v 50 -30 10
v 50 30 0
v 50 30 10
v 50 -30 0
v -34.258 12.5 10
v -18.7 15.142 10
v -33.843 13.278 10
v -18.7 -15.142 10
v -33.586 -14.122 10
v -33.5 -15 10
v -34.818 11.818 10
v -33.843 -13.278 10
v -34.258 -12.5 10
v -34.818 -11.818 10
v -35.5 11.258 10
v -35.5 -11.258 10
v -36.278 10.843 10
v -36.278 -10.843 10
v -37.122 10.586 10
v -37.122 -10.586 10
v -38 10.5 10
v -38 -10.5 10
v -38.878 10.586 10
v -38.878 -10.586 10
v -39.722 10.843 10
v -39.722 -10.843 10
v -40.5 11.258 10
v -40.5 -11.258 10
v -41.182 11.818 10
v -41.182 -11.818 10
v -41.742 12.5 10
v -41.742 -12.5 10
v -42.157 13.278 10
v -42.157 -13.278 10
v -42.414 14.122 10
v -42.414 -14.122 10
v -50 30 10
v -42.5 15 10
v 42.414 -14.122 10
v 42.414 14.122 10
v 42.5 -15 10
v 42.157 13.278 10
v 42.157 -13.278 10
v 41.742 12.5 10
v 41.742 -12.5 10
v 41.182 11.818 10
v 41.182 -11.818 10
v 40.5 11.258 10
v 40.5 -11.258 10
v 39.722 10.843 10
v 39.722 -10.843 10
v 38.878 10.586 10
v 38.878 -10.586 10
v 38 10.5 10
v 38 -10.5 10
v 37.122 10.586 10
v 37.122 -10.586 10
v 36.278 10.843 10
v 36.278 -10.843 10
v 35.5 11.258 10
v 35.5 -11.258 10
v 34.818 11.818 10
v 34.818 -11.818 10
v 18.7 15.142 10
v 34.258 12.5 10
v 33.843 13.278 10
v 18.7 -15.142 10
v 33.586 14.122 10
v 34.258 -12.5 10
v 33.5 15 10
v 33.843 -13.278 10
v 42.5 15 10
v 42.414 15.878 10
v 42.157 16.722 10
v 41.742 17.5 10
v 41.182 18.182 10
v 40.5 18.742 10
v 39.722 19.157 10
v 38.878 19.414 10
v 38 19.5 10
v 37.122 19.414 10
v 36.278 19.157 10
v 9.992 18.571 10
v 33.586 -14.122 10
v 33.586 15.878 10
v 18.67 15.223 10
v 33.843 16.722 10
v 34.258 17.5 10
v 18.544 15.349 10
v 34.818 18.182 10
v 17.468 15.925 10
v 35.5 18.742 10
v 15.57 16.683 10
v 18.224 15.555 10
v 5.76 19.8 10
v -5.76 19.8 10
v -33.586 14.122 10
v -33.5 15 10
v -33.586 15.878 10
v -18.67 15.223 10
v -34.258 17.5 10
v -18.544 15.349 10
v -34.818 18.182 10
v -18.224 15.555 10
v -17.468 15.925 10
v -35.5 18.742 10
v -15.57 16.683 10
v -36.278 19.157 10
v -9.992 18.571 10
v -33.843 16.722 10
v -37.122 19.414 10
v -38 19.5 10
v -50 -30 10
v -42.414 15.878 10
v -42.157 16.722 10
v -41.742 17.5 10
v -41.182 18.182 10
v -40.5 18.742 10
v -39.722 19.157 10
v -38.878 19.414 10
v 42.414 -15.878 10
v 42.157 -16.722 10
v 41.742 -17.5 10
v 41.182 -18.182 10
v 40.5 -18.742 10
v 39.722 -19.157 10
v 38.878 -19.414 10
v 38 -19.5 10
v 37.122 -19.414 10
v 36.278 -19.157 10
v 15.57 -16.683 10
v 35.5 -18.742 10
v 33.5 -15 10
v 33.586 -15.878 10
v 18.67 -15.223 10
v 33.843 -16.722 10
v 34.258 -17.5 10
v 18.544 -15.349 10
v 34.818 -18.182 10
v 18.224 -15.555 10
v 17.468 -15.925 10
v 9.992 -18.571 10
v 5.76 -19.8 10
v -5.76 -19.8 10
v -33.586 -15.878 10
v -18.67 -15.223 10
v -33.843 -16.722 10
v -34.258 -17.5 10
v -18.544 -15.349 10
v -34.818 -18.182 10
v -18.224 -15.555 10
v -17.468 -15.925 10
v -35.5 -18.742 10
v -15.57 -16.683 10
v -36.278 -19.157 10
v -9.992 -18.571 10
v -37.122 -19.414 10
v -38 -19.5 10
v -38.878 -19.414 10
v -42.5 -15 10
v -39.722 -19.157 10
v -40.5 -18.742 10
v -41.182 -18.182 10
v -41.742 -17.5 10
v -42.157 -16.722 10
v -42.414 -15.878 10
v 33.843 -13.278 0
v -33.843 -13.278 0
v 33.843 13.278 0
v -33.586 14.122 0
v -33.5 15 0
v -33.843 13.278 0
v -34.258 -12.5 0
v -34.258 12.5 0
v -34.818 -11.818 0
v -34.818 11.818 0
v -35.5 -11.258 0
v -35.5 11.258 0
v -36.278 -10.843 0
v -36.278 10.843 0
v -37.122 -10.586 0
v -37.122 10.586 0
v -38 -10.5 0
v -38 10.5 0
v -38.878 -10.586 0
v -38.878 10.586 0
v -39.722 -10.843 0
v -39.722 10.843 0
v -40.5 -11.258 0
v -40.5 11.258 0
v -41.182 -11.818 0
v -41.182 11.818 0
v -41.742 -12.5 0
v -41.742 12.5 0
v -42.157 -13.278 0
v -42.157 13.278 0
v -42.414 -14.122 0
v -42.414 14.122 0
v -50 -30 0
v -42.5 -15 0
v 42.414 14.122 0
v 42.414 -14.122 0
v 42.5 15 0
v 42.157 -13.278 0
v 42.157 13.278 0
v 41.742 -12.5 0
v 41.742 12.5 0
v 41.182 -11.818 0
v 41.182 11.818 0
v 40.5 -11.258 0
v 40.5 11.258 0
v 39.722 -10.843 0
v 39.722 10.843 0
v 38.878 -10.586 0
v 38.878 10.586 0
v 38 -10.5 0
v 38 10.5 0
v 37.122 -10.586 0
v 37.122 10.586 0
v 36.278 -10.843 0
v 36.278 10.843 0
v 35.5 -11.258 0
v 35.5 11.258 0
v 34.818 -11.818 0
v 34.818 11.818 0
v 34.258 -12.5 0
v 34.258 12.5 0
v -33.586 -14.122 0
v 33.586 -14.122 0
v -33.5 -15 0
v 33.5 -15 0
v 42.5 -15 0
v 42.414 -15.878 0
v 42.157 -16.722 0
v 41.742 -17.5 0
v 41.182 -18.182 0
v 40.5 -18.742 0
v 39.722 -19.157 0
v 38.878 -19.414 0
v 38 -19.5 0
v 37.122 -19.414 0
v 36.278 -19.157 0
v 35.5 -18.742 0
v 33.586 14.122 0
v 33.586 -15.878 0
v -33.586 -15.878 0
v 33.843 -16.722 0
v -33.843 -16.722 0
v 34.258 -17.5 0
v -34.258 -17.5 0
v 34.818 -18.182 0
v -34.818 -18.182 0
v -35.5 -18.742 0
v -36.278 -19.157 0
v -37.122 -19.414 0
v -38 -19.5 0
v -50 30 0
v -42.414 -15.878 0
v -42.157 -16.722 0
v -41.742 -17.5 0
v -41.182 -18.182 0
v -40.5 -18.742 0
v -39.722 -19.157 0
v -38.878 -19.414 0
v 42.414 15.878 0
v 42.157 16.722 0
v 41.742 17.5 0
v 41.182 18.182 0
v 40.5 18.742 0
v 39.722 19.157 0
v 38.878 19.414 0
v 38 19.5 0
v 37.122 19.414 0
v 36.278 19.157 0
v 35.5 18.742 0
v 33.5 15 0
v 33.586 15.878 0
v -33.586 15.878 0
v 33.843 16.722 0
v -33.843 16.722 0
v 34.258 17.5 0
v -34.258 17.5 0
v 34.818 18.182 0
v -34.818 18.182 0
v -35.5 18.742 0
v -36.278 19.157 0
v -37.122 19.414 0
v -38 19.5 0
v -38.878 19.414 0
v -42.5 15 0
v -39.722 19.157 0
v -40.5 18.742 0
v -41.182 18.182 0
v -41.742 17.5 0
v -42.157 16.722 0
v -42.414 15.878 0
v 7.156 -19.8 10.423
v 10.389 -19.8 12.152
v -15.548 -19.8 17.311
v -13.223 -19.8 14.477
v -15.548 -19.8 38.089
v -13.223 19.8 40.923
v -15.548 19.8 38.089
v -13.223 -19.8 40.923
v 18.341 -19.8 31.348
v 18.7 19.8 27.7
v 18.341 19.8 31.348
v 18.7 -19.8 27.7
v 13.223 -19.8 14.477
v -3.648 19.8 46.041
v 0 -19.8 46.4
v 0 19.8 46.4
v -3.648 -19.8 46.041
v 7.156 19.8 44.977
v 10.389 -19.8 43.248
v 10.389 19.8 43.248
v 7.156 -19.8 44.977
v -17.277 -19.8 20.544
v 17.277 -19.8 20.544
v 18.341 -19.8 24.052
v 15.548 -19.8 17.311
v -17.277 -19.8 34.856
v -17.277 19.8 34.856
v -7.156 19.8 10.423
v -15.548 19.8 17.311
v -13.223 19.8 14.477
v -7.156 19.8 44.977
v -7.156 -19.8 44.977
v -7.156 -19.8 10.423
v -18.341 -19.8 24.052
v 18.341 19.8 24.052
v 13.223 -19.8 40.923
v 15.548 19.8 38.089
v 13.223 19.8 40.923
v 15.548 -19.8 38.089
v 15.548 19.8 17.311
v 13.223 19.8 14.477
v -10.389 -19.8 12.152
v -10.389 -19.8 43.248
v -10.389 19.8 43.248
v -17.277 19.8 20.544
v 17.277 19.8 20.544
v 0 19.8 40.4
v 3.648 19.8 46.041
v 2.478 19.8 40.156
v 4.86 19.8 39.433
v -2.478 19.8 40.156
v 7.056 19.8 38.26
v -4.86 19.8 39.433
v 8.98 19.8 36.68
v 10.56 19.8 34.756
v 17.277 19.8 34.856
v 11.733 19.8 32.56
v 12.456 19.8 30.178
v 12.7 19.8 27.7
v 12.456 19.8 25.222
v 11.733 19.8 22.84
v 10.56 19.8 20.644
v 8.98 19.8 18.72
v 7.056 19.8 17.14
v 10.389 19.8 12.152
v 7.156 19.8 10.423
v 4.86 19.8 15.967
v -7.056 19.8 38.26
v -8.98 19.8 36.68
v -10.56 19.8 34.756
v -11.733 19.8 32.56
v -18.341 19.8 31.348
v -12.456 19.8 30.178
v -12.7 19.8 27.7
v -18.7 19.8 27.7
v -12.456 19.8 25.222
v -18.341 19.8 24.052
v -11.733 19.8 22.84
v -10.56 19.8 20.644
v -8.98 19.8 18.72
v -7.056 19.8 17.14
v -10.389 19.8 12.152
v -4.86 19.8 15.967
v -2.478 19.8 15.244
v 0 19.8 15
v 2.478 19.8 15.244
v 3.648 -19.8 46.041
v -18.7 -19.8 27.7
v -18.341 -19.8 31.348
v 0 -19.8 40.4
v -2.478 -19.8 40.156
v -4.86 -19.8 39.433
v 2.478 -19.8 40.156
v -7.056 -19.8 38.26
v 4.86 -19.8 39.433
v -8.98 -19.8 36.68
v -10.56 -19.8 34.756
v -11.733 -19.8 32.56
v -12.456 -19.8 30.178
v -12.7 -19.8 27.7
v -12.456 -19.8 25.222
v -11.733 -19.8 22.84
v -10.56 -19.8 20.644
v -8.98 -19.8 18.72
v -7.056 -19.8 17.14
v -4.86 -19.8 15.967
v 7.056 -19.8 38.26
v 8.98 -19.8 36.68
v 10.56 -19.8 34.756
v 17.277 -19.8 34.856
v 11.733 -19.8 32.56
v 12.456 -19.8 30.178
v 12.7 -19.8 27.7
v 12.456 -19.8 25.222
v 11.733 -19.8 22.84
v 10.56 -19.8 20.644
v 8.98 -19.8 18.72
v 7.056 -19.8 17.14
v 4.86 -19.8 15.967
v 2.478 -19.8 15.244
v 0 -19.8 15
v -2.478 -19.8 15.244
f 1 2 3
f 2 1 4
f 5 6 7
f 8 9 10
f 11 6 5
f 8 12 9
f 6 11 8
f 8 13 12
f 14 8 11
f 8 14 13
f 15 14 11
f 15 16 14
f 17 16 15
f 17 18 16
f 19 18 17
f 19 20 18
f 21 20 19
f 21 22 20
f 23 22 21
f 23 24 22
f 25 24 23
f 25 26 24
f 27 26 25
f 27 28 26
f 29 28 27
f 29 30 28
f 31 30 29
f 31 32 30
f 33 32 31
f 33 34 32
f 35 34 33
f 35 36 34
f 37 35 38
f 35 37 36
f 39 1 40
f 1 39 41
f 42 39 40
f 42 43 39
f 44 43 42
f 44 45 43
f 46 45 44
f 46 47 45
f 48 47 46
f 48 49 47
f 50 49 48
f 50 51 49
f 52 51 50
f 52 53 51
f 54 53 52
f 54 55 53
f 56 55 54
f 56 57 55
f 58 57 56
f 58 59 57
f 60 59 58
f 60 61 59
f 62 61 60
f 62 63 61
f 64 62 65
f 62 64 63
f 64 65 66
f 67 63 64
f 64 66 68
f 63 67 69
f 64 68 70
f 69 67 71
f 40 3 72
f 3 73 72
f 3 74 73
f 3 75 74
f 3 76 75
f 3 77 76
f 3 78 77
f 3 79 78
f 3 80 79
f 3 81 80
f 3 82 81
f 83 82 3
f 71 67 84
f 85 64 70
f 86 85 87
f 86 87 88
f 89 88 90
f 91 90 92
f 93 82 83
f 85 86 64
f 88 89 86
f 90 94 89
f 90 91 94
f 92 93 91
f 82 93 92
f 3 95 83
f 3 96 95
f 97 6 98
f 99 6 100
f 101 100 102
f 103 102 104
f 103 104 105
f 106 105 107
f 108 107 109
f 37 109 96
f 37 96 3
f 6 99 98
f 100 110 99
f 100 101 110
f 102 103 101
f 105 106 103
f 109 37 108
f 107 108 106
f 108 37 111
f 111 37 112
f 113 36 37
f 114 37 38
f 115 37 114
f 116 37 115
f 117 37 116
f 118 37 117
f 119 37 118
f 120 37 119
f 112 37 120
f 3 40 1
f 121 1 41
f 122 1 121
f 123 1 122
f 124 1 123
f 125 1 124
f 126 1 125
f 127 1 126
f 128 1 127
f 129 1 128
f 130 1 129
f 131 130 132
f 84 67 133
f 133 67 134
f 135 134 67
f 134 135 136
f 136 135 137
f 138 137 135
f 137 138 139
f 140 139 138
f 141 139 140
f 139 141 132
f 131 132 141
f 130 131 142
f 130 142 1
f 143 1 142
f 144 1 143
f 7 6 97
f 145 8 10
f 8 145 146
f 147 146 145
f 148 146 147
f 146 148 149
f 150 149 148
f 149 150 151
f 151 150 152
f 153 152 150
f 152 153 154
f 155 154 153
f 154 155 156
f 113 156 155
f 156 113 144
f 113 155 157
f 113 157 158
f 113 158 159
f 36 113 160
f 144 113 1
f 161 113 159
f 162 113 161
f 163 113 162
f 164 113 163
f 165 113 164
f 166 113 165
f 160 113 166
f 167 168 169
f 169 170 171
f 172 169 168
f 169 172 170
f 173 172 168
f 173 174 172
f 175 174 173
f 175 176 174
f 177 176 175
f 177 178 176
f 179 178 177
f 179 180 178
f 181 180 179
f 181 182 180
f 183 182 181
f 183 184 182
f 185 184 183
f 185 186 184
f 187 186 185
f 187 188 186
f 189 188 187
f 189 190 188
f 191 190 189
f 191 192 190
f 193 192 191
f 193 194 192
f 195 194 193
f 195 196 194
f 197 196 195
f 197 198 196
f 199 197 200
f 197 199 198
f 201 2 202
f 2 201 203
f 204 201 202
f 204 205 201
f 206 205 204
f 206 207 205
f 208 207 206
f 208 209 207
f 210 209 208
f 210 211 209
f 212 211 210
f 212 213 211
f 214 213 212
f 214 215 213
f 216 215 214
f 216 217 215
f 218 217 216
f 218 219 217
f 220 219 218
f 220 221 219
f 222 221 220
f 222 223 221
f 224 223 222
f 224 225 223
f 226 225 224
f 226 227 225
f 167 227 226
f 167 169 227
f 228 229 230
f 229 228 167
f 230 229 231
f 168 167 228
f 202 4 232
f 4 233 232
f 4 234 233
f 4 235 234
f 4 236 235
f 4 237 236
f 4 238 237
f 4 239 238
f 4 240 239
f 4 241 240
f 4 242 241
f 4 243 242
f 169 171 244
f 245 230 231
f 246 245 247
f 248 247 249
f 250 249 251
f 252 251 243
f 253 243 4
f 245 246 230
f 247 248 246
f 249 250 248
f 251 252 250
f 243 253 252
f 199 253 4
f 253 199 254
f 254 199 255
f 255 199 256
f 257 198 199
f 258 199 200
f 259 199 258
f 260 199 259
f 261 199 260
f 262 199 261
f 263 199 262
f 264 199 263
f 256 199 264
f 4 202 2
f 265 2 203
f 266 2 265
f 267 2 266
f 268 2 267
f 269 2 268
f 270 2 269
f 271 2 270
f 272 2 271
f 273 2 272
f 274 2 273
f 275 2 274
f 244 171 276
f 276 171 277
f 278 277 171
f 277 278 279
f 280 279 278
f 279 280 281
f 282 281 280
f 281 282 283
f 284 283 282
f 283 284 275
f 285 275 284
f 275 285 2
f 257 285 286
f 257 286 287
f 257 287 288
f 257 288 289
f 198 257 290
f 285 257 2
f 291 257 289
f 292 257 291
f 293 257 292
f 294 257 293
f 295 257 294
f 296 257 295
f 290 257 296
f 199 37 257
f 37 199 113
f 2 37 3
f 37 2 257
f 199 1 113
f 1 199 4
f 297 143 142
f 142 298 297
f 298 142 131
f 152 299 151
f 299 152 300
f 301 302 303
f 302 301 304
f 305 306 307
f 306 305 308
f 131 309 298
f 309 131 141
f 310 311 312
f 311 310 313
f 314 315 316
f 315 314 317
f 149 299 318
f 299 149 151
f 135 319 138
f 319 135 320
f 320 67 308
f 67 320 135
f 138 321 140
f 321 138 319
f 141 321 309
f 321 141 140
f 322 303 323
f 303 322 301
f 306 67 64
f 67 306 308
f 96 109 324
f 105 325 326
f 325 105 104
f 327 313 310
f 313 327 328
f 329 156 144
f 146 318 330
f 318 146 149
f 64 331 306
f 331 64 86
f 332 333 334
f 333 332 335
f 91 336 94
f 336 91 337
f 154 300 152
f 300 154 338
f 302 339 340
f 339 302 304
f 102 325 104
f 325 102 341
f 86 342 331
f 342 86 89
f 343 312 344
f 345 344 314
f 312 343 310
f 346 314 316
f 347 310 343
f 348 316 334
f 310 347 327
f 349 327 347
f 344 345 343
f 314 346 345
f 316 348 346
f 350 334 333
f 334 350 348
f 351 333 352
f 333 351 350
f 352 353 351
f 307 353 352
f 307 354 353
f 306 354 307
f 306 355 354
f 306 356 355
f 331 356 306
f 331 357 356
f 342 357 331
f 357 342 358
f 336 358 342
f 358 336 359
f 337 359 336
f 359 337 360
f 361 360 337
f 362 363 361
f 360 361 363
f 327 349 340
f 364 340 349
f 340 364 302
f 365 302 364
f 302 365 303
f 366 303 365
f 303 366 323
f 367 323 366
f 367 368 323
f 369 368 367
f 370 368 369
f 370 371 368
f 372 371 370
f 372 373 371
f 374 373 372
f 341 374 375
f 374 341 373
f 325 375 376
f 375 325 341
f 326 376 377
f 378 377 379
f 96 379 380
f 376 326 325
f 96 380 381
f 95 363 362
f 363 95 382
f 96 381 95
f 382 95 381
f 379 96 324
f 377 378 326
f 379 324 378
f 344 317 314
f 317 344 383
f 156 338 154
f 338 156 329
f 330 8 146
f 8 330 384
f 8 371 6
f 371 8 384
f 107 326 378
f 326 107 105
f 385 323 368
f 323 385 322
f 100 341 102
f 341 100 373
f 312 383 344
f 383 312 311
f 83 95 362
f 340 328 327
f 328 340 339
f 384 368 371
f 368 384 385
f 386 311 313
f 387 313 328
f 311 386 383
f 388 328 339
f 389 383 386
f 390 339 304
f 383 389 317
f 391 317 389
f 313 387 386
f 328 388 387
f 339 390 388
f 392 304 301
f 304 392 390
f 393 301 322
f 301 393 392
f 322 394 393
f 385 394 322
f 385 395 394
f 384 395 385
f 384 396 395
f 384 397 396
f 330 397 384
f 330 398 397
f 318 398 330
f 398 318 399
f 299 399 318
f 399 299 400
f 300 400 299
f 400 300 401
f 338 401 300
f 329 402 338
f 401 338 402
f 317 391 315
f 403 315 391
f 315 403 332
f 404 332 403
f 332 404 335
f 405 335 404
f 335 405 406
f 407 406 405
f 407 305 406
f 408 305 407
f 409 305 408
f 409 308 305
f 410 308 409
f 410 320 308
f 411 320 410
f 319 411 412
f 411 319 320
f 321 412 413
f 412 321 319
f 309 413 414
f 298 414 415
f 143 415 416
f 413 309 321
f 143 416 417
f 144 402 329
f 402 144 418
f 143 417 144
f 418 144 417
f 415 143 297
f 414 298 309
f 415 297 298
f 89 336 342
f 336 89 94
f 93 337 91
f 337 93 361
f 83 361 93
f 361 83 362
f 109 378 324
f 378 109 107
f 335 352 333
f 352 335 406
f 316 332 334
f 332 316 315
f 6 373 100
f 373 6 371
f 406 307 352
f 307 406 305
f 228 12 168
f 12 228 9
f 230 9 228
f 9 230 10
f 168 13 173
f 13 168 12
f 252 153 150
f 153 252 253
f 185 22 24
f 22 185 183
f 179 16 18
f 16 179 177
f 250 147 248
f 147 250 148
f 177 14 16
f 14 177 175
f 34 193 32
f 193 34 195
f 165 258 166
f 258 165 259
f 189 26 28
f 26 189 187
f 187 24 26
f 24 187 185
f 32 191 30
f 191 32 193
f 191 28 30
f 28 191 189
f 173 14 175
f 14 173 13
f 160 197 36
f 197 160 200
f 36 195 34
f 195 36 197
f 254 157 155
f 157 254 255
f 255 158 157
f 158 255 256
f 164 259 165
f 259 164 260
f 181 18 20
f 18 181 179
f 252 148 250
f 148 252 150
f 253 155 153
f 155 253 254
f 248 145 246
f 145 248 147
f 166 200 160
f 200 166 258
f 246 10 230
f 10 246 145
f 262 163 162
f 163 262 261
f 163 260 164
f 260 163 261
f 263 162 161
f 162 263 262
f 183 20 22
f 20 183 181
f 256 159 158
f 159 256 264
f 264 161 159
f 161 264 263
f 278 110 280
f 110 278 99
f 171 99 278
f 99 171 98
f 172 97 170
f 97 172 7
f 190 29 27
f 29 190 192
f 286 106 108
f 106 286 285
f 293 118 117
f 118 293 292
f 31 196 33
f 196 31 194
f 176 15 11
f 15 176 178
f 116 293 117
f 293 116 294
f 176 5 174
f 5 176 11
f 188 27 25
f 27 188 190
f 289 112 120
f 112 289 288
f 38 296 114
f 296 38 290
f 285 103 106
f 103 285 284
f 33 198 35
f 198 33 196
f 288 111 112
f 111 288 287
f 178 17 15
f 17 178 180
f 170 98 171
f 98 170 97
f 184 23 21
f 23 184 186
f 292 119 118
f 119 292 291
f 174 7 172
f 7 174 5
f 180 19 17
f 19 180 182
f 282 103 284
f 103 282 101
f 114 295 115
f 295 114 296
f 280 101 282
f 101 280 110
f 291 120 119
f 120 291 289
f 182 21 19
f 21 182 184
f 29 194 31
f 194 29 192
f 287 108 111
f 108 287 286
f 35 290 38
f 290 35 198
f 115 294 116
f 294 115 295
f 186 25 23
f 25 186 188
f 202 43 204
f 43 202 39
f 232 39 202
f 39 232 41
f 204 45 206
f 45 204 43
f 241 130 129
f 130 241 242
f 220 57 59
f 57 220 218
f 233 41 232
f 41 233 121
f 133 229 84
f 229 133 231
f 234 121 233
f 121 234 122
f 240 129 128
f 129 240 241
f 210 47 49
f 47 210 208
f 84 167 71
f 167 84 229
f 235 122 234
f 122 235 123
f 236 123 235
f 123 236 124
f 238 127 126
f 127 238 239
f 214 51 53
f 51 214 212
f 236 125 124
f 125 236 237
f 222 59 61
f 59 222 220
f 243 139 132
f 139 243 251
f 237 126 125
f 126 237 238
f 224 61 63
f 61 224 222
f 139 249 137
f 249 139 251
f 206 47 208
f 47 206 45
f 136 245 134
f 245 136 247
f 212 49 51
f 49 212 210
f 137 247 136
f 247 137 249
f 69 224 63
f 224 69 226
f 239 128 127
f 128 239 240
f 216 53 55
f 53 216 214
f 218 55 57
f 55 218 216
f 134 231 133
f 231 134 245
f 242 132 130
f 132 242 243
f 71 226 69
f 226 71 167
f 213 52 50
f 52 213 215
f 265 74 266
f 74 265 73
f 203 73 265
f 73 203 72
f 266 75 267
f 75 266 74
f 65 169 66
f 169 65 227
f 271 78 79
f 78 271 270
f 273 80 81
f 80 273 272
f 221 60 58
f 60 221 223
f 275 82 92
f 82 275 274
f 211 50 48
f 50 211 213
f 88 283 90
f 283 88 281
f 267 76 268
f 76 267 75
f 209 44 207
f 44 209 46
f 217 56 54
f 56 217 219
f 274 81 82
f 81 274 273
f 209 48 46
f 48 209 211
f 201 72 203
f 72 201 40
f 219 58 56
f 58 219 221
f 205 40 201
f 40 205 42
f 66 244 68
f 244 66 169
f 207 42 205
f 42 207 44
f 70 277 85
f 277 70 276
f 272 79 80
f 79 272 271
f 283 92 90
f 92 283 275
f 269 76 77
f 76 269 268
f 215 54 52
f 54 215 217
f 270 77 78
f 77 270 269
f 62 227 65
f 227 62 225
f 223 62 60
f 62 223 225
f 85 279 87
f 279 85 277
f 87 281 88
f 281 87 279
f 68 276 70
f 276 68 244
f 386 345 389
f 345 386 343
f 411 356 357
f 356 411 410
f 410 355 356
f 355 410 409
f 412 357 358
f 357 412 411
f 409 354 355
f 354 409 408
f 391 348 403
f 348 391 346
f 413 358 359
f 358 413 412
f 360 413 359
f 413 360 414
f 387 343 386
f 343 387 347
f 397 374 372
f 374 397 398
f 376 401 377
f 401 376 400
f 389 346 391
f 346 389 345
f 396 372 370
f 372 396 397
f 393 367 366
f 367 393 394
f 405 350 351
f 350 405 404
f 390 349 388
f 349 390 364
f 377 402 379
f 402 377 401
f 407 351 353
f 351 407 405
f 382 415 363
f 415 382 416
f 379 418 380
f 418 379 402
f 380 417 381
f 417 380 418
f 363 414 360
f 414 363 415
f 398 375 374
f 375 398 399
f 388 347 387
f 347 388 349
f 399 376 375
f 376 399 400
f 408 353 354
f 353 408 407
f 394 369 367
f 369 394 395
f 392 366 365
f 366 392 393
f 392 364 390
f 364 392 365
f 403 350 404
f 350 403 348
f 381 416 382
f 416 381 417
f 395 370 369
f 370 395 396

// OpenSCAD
$fn = 32;

// ----------------------------------------------------------------------
// Bearing block: 100 x 60 mm base, 25.4 mm bore at 27.7 mm
// ----------------------------------------------------------------------

// --- parameters (mm) ---
base_w = 100;             // base width
base_d = 60;              // base depth
base_t = 10;              // base thickness
bore_d = 25.4;            // shaft / bearing bore
house_r = 18.7;           // housing outer radius
house_len = 39.6;         // housing length along the shaft
foot_w = 37.4;            // foot width under the housing
foot_len = 29.6;          // foot length along the shaft
axis_z = 27.7;            // bore axis height above the base
holes_d = 9;              // mounting holes
hole_x = 38;              // mounting hole spacing

difference() {
  union() {
    /* base plate with its underside on z = 0 */
    translate([0, 0, base_t / 2]) cube([base_w, base_d, base_t], center = true);
    /* hull foot: a straight web blending into the round housing */
    hull() {
      translate([0, 0, base_t - 0.5]) cube([foot_w, foot_len, 1.6], center = true);
      translate([0, 0, axis_z]) rotate([-90, 0, 0]) cylinder(h = house_len, d = 2 * house_r, center = true);
    }
  }
  /* bore through the housing, 2.5 mm clear on both sides */
  translate([0, 0, axis_z]) rotate([-90, 0, 0]) cylinder(h = house_len + 5, d = bore_d, center = true);
  /* mounting holes through the base plate */
  for (hx = [-38, 38]) {
    for (hy = [-15, 15]) {
      translate([hx, hy, -2.5]) cylinder(h = base_t + 5, d = holes_d);
    }
  }
}
